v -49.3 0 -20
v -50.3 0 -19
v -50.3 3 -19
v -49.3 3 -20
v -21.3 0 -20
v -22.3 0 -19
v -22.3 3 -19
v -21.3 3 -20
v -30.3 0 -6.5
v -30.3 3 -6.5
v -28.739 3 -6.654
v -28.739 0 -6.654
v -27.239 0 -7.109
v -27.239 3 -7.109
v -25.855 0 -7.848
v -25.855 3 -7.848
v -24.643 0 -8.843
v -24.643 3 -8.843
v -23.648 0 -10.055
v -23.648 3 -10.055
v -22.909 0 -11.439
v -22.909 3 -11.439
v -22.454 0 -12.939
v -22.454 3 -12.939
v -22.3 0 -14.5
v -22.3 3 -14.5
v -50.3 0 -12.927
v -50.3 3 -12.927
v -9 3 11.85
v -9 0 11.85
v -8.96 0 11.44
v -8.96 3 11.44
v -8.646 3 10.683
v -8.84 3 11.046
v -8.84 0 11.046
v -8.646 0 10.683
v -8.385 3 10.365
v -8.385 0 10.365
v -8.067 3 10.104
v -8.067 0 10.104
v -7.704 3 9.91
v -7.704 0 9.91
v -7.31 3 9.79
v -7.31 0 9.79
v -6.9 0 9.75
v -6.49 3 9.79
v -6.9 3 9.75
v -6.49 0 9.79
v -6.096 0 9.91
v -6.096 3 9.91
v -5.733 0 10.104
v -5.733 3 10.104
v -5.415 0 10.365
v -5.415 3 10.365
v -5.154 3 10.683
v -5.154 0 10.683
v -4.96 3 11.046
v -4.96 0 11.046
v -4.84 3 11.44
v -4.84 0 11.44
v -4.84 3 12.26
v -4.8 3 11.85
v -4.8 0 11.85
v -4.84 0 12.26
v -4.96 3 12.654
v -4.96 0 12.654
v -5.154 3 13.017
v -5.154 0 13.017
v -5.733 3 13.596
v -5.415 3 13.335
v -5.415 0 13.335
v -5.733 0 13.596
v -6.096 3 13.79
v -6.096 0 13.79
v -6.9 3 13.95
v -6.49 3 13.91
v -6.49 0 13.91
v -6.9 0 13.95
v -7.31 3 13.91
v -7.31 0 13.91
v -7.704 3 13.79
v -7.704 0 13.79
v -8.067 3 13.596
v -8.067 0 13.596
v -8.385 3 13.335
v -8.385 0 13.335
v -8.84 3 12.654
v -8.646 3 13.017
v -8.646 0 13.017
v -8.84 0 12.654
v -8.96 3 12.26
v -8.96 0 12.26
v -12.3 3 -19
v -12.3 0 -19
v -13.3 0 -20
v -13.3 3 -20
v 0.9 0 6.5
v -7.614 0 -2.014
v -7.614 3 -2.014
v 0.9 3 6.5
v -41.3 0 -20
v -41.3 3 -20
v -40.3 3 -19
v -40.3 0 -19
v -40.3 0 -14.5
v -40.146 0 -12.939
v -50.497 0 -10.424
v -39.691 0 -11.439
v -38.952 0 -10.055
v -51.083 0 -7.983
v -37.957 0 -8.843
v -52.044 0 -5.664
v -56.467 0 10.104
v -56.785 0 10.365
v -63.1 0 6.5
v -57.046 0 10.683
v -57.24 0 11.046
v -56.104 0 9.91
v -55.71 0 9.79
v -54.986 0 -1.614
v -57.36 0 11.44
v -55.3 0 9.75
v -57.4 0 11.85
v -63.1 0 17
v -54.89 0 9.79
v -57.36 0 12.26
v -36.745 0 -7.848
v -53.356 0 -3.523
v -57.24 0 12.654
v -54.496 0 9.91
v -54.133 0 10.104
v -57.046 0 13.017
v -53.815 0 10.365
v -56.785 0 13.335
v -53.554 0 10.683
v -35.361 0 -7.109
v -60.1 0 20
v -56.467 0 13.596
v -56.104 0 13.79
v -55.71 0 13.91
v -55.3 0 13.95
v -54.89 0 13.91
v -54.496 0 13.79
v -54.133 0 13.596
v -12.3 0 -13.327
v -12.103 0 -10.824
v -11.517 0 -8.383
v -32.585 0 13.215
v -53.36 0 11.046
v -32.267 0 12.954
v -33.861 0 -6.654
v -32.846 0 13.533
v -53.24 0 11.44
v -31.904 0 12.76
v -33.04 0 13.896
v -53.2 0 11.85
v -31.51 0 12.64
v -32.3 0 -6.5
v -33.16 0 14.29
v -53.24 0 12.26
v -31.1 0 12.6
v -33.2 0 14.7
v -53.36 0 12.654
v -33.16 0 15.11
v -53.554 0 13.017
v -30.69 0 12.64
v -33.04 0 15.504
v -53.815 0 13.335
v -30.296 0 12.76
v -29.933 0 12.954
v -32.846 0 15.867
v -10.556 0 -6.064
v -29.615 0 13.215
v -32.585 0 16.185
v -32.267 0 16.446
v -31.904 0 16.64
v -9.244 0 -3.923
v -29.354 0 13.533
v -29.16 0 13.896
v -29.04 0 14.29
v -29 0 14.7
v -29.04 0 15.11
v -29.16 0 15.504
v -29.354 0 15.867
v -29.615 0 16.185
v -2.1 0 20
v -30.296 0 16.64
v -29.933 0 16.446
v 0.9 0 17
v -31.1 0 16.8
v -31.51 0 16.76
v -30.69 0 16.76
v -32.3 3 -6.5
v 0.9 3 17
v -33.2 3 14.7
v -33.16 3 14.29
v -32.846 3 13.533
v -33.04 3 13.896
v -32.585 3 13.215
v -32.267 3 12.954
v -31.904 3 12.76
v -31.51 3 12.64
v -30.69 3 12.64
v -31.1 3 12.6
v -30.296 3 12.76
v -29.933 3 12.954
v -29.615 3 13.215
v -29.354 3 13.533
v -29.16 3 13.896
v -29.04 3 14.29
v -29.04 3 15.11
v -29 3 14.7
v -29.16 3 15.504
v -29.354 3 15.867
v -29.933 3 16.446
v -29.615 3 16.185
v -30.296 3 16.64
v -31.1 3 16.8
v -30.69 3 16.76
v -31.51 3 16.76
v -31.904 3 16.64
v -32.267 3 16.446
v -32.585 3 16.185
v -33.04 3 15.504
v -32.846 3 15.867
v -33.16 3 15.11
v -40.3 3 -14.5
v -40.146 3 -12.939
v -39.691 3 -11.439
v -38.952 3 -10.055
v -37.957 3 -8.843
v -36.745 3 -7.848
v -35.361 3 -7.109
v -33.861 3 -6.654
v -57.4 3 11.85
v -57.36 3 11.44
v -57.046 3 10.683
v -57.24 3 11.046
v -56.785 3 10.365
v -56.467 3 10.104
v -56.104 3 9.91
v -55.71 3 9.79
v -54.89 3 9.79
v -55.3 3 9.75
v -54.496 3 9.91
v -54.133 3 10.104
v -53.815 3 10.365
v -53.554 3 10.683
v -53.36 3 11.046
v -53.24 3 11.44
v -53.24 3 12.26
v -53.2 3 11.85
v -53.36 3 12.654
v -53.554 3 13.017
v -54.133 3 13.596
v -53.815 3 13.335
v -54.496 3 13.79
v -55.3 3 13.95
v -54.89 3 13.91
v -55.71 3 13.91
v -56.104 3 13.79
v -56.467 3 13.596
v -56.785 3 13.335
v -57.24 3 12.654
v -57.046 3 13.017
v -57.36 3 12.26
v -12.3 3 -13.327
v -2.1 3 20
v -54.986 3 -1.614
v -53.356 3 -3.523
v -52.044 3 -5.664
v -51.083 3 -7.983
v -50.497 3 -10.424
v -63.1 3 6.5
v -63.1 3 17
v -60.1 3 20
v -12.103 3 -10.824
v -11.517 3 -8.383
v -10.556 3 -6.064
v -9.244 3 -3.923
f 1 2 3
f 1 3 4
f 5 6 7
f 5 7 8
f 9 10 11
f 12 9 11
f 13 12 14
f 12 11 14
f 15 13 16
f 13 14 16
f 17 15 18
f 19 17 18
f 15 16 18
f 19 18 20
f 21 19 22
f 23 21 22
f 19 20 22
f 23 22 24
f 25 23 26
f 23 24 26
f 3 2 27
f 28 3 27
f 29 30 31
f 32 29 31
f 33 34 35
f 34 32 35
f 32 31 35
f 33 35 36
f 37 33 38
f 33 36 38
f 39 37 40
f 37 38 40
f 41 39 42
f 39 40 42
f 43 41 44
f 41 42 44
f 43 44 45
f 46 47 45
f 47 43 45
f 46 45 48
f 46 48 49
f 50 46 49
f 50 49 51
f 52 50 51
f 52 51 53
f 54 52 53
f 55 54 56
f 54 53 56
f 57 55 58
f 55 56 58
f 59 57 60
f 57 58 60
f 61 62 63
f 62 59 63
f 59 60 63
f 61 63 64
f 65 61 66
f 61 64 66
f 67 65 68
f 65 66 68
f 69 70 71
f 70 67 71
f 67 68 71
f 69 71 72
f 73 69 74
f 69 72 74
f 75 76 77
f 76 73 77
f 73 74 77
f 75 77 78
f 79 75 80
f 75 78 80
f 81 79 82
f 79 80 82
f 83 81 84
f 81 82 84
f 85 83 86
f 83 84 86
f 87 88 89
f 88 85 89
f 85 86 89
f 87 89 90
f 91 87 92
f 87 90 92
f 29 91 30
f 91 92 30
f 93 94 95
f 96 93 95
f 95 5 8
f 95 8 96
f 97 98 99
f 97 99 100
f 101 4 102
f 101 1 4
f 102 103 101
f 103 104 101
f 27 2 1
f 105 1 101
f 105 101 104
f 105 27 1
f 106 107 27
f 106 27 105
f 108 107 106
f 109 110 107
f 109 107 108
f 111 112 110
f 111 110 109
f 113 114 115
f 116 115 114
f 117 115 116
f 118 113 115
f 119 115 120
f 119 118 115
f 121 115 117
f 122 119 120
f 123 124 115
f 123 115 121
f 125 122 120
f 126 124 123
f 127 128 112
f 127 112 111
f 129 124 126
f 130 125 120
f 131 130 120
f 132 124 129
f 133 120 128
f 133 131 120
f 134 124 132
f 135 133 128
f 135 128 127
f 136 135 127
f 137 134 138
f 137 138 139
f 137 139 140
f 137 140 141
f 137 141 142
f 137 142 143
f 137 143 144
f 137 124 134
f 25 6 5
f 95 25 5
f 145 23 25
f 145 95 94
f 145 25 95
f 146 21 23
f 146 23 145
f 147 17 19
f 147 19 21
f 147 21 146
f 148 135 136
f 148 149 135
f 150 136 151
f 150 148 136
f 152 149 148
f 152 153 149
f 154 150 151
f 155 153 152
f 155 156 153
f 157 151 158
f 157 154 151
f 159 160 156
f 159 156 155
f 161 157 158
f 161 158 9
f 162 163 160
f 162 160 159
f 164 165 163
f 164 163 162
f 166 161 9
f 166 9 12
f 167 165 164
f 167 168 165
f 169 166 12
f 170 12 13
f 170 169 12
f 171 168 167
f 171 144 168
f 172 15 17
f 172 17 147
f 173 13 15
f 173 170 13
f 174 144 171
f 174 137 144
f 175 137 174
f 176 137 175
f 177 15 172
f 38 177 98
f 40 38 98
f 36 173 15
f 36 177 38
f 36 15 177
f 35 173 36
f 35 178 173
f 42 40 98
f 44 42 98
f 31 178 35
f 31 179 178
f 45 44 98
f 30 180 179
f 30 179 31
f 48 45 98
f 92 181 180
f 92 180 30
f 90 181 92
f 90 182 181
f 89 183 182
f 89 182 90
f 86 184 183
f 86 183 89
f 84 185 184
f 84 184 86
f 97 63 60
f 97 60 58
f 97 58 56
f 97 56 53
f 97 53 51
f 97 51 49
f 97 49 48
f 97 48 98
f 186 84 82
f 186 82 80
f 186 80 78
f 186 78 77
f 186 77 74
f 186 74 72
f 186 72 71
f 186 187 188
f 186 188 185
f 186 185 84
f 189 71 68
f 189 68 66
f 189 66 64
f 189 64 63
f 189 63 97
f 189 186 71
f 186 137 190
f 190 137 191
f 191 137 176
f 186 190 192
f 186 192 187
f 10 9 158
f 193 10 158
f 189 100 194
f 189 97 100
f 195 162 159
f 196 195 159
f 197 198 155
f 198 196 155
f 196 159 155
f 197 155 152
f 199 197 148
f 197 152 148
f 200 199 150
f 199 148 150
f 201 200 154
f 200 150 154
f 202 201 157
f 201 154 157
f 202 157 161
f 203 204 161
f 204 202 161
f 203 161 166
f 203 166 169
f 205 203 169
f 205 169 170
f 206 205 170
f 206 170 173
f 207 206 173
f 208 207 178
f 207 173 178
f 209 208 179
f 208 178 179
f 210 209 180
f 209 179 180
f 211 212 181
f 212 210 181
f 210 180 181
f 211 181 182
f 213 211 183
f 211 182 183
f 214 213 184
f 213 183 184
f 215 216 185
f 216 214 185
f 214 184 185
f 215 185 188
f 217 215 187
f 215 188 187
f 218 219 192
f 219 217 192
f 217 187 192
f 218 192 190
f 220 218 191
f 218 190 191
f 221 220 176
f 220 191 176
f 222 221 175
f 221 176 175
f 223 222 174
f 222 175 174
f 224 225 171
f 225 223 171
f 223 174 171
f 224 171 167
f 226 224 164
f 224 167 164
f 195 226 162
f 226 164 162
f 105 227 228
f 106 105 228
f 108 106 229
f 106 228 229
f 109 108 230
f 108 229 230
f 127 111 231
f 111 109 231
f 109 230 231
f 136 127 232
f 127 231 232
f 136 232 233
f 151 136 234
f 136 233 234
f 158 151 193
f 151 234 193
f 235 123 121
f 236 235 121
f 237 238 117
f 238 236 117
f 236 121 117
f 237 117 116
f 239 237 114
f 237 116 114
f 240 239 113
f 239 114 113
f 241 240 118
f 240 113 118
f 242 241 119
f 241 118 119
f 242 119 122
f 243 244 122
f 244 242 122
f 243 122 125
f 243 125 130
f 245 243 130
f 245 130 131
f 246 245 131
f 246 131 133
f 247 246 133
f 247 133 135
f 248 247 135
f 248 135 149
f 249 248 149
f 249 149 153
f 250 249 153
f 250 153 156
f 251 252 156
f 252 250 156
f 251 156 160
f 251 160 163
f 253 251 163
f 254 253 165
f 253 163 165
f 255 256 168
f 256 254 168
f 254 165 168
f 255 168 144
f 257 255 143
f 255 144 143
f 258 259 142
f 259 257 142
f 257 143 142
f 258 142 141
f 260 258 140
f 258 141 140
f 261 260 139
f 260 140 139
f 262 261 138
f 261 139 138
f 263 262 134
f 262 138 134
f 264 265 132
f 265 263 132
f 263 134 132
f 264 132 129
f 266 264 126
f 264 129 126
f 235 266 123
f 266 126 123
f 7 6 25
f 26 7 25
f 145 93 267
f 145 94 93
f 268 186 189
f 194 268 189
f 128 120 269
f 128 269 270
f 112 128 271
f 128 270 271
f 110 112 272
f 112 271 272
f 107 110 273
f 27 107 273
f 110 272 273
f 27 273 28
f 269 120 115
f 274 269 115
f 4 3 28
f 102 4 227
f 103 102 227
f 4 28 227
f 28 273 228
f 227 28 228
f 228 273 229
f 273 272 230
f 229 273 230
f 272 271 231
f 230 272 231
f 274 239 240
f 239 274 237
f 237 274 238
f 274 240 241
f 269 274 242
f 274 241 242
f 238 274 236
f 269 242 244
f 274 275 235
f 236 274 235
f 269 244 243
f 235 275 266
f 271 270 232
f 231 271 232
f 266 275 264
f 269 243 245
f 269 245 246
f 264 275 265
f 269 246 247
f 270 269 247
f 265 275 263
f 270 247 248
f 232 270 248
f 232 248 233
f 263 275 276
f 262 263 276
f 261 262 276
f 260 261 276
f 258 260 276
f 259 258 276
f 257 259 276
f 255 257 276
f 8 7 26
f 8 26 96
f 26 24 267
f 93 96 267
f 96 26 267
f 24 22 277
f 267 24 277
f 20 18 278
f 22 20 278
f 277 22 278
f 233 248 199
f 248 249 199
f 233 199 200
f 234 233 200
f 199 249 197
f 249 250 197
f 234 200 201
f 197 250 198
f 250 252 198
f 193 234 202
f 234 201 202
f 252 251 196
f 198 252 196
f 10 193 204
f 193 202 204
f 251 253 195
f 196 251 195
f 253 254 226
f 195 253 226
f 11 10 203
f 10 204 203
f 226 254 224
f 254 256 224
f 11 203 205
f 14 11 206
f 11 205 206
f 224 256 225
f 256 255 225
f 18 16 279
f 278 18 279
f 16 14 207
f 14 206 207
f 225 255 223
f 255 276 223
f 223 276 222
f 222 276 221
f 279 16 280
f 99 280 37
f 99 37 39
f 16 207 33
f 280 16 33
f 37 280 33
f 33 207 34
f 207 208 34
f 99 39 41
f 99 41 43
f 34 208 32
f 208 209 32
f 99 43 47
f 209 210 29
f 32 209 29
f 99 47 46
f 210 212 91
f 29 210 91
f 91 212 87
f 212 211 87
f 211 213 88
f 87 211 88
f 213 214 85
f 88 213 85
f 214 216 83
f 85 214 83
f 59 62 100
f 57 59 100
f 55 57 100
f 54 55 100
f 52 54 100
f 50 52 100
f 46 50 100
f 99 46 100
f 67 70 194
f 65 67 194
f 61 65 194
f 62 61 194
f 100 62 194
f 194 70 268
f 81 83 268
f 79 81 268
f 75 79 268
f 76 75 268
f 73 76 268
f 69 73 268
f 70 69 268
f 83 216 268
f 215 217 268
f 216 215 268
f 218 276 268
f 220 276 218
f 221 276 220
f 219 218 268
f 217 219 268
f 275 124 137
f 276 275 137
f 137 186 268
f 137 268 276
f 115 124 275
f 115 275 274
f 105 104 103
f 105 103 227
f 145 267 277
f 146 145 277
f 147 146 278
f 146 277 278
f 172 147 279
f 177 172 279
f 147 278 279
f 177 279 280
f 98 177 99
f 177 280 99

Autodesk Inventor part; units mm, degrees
ref_plane "YZ Plane" through (0, 0, 0) normal (1, 0, 0) x (0, 1, 0)
ref_plane "XZ Plane" through (0, 0, 0) normal (0, 1, 0) x (-1, 0, 0)
ref_plane "XY Plane" through (0, 0, 0) normal (0, 0, 1) x (1, 0, 0)
sketch "スケッチ3" plane through (0, 0, 0) normal (0, 1, 0) x (-1, 0, 0)
  circle A0 centre (55.3, 11.85) radius 2.1
  circle A1 centre (31.1, 14.7) radius 2.1
  circle A2 centre (6.9, 11.85) radius 2.1
  line L0 (62.1, 5.5) -> (0.1, 5.5)
  line L1 (2.1, 20) -> (60.1, 20)
  line L2 (-0.9, 6.5) -> (-0.9, 17)
  line L3 (63.1, 17) -> (63.1, 6.5)
  line L4 (49.3, -20) -> (41.3, -20)
  line L5 (21.3, -20) -> (13.3, -20)
  line L6 (63.1, 17) -> (60.1, 20)
  line L7 (2.1, 20) -> (-0.9, 17)
  line L8 (50.3, -19) -> (50.3, 5.5)
  line L9 (40.3, -19) -> (40.3, 5.5)
  line L10 (22.3, -19) -> (22.3, 5.5)
  line L11 (12.3, -19) -> (12.3, 5.5)
  line L12 (62.1, 5.5) -> (63.1, 6.5)
  line L13 (0.1, 5.5) -> (-0.9, 6.5)
  line L14 (12.3, -19) -> (13.3, -20)
  line L15 (22.3, -19) -> (21.3, -20)
  line L16 (40.3, -19) -> (41.3, -20)
  line L17 (50.3, -19) -> (49.3, -20)
  point P0 (0, 0)
  point P1 (-0.9, 20)
  point P2 (-0.9, 5.5)
  point P3 (63.1, 5.5)
  point P4 (50.3, -20)
  point P5 (40.3, -20)
  point P6 (22.3, -20)
  point P7 (12.3, -20)
  point P8 (61.6, 18.5)
  dimension "d2" = 3
  dimension "d3" = 3
  dimension "d4" = 4.2
  dimension "d5" = 4.2
  dimension "d6" = 4.2
  dimension "d7" = 10
  dimension "d8" = 10
  dimension "d11" = 1
  dimension "d12" = 1
  dimension "d13" = 1
  dimension "d14" = 1
  dimension "d16" = 1
  dimension "d17" = 1
  dimension "d18" = 1
  dimension "d19" = 1
  dimension "d20" = 1
  dimension "d21" = 1
  dimension "d22" = 1
extrude "押し出し1" add sketch "スケッチ3" along normal blind 3
sketch "スケッチ4" plane through (0, 0, 0) normal (0, -1, 0) x (1, 0, 0)
  line L0 (-40.3, 5.5) -> (-22.3, 5.5)
  line L1 (-22.3, 5.5) -> (-22.3, -6.5)
  line L2 (-22.3, -6.5) -> (-40.3, -6.5)
  line L3 (-40.3, -6.5) -> (-40.3, 5.5)
  line L4 (-22.3, -19) -> (-22.3, 5.5) projected
  point P0 (0, 0)
  dimension "d23" = 12
extrude "押し出し2" add sketch "スケッチ4" against normal blind 3
sketch "スケッチ5" plane through (0, 0, 0) normal (0, -1, 0) x (1, 0, 0)
  line L0 (-0.1, 5.5) -> (-12.3, 5.5)
  line L1 (-12.3, 5.5) -> (-12.3, -6.7)
  line L2 (-12.3, -6.7) -> (-0.1, 5.5)
  line L3 (0.9, 6.5) -> (-0.1, 5.5) projected
  line L4 (-50.3, -6.3) -> (-50.3, 5.5)
  line L5 (-50.3, 5.5) -> (-62.1, 5.5)
  line L6 (-62.1, 5.5) -> (-50.3, -6.3)
  line L7 (-62.1, 5.5) -> (-63.1, 6.5) projected
  point P0 (0, 0)
extrude "押し出し3" add sketch "スケッチ5" against normal blind 3
fillet "フィレット2" radius 8 2 edges at (-22.3, 1.5, -6.5) (-40.3, 1.5, -6.5)
fillet "フィレット2" radius 16 2 edges at (-12.3, 1.5, -6.7) (-50.3, 1.5, -6.3)
equation "\"d2\" = d0"
equation "\"d3\" = d2"
equation "\"d7\" = d8"
equation "\"d12\" = d11"
equation "\"d13\" = d11"
equation "\"d14\" = d13"
equation "\"d16\" = d15"
equation "\"d17\" = d11"
equation "\"d18\" = d17"
equation "\"d19\" = d11"
equation "\"d20\" = d19"
equation "\"d21\" = d11"
equation "\"d22\" = d21"
equation "\"d15\" = d11"
equation "\"d0\" = 3"
properties part number "stopperver2_2"
